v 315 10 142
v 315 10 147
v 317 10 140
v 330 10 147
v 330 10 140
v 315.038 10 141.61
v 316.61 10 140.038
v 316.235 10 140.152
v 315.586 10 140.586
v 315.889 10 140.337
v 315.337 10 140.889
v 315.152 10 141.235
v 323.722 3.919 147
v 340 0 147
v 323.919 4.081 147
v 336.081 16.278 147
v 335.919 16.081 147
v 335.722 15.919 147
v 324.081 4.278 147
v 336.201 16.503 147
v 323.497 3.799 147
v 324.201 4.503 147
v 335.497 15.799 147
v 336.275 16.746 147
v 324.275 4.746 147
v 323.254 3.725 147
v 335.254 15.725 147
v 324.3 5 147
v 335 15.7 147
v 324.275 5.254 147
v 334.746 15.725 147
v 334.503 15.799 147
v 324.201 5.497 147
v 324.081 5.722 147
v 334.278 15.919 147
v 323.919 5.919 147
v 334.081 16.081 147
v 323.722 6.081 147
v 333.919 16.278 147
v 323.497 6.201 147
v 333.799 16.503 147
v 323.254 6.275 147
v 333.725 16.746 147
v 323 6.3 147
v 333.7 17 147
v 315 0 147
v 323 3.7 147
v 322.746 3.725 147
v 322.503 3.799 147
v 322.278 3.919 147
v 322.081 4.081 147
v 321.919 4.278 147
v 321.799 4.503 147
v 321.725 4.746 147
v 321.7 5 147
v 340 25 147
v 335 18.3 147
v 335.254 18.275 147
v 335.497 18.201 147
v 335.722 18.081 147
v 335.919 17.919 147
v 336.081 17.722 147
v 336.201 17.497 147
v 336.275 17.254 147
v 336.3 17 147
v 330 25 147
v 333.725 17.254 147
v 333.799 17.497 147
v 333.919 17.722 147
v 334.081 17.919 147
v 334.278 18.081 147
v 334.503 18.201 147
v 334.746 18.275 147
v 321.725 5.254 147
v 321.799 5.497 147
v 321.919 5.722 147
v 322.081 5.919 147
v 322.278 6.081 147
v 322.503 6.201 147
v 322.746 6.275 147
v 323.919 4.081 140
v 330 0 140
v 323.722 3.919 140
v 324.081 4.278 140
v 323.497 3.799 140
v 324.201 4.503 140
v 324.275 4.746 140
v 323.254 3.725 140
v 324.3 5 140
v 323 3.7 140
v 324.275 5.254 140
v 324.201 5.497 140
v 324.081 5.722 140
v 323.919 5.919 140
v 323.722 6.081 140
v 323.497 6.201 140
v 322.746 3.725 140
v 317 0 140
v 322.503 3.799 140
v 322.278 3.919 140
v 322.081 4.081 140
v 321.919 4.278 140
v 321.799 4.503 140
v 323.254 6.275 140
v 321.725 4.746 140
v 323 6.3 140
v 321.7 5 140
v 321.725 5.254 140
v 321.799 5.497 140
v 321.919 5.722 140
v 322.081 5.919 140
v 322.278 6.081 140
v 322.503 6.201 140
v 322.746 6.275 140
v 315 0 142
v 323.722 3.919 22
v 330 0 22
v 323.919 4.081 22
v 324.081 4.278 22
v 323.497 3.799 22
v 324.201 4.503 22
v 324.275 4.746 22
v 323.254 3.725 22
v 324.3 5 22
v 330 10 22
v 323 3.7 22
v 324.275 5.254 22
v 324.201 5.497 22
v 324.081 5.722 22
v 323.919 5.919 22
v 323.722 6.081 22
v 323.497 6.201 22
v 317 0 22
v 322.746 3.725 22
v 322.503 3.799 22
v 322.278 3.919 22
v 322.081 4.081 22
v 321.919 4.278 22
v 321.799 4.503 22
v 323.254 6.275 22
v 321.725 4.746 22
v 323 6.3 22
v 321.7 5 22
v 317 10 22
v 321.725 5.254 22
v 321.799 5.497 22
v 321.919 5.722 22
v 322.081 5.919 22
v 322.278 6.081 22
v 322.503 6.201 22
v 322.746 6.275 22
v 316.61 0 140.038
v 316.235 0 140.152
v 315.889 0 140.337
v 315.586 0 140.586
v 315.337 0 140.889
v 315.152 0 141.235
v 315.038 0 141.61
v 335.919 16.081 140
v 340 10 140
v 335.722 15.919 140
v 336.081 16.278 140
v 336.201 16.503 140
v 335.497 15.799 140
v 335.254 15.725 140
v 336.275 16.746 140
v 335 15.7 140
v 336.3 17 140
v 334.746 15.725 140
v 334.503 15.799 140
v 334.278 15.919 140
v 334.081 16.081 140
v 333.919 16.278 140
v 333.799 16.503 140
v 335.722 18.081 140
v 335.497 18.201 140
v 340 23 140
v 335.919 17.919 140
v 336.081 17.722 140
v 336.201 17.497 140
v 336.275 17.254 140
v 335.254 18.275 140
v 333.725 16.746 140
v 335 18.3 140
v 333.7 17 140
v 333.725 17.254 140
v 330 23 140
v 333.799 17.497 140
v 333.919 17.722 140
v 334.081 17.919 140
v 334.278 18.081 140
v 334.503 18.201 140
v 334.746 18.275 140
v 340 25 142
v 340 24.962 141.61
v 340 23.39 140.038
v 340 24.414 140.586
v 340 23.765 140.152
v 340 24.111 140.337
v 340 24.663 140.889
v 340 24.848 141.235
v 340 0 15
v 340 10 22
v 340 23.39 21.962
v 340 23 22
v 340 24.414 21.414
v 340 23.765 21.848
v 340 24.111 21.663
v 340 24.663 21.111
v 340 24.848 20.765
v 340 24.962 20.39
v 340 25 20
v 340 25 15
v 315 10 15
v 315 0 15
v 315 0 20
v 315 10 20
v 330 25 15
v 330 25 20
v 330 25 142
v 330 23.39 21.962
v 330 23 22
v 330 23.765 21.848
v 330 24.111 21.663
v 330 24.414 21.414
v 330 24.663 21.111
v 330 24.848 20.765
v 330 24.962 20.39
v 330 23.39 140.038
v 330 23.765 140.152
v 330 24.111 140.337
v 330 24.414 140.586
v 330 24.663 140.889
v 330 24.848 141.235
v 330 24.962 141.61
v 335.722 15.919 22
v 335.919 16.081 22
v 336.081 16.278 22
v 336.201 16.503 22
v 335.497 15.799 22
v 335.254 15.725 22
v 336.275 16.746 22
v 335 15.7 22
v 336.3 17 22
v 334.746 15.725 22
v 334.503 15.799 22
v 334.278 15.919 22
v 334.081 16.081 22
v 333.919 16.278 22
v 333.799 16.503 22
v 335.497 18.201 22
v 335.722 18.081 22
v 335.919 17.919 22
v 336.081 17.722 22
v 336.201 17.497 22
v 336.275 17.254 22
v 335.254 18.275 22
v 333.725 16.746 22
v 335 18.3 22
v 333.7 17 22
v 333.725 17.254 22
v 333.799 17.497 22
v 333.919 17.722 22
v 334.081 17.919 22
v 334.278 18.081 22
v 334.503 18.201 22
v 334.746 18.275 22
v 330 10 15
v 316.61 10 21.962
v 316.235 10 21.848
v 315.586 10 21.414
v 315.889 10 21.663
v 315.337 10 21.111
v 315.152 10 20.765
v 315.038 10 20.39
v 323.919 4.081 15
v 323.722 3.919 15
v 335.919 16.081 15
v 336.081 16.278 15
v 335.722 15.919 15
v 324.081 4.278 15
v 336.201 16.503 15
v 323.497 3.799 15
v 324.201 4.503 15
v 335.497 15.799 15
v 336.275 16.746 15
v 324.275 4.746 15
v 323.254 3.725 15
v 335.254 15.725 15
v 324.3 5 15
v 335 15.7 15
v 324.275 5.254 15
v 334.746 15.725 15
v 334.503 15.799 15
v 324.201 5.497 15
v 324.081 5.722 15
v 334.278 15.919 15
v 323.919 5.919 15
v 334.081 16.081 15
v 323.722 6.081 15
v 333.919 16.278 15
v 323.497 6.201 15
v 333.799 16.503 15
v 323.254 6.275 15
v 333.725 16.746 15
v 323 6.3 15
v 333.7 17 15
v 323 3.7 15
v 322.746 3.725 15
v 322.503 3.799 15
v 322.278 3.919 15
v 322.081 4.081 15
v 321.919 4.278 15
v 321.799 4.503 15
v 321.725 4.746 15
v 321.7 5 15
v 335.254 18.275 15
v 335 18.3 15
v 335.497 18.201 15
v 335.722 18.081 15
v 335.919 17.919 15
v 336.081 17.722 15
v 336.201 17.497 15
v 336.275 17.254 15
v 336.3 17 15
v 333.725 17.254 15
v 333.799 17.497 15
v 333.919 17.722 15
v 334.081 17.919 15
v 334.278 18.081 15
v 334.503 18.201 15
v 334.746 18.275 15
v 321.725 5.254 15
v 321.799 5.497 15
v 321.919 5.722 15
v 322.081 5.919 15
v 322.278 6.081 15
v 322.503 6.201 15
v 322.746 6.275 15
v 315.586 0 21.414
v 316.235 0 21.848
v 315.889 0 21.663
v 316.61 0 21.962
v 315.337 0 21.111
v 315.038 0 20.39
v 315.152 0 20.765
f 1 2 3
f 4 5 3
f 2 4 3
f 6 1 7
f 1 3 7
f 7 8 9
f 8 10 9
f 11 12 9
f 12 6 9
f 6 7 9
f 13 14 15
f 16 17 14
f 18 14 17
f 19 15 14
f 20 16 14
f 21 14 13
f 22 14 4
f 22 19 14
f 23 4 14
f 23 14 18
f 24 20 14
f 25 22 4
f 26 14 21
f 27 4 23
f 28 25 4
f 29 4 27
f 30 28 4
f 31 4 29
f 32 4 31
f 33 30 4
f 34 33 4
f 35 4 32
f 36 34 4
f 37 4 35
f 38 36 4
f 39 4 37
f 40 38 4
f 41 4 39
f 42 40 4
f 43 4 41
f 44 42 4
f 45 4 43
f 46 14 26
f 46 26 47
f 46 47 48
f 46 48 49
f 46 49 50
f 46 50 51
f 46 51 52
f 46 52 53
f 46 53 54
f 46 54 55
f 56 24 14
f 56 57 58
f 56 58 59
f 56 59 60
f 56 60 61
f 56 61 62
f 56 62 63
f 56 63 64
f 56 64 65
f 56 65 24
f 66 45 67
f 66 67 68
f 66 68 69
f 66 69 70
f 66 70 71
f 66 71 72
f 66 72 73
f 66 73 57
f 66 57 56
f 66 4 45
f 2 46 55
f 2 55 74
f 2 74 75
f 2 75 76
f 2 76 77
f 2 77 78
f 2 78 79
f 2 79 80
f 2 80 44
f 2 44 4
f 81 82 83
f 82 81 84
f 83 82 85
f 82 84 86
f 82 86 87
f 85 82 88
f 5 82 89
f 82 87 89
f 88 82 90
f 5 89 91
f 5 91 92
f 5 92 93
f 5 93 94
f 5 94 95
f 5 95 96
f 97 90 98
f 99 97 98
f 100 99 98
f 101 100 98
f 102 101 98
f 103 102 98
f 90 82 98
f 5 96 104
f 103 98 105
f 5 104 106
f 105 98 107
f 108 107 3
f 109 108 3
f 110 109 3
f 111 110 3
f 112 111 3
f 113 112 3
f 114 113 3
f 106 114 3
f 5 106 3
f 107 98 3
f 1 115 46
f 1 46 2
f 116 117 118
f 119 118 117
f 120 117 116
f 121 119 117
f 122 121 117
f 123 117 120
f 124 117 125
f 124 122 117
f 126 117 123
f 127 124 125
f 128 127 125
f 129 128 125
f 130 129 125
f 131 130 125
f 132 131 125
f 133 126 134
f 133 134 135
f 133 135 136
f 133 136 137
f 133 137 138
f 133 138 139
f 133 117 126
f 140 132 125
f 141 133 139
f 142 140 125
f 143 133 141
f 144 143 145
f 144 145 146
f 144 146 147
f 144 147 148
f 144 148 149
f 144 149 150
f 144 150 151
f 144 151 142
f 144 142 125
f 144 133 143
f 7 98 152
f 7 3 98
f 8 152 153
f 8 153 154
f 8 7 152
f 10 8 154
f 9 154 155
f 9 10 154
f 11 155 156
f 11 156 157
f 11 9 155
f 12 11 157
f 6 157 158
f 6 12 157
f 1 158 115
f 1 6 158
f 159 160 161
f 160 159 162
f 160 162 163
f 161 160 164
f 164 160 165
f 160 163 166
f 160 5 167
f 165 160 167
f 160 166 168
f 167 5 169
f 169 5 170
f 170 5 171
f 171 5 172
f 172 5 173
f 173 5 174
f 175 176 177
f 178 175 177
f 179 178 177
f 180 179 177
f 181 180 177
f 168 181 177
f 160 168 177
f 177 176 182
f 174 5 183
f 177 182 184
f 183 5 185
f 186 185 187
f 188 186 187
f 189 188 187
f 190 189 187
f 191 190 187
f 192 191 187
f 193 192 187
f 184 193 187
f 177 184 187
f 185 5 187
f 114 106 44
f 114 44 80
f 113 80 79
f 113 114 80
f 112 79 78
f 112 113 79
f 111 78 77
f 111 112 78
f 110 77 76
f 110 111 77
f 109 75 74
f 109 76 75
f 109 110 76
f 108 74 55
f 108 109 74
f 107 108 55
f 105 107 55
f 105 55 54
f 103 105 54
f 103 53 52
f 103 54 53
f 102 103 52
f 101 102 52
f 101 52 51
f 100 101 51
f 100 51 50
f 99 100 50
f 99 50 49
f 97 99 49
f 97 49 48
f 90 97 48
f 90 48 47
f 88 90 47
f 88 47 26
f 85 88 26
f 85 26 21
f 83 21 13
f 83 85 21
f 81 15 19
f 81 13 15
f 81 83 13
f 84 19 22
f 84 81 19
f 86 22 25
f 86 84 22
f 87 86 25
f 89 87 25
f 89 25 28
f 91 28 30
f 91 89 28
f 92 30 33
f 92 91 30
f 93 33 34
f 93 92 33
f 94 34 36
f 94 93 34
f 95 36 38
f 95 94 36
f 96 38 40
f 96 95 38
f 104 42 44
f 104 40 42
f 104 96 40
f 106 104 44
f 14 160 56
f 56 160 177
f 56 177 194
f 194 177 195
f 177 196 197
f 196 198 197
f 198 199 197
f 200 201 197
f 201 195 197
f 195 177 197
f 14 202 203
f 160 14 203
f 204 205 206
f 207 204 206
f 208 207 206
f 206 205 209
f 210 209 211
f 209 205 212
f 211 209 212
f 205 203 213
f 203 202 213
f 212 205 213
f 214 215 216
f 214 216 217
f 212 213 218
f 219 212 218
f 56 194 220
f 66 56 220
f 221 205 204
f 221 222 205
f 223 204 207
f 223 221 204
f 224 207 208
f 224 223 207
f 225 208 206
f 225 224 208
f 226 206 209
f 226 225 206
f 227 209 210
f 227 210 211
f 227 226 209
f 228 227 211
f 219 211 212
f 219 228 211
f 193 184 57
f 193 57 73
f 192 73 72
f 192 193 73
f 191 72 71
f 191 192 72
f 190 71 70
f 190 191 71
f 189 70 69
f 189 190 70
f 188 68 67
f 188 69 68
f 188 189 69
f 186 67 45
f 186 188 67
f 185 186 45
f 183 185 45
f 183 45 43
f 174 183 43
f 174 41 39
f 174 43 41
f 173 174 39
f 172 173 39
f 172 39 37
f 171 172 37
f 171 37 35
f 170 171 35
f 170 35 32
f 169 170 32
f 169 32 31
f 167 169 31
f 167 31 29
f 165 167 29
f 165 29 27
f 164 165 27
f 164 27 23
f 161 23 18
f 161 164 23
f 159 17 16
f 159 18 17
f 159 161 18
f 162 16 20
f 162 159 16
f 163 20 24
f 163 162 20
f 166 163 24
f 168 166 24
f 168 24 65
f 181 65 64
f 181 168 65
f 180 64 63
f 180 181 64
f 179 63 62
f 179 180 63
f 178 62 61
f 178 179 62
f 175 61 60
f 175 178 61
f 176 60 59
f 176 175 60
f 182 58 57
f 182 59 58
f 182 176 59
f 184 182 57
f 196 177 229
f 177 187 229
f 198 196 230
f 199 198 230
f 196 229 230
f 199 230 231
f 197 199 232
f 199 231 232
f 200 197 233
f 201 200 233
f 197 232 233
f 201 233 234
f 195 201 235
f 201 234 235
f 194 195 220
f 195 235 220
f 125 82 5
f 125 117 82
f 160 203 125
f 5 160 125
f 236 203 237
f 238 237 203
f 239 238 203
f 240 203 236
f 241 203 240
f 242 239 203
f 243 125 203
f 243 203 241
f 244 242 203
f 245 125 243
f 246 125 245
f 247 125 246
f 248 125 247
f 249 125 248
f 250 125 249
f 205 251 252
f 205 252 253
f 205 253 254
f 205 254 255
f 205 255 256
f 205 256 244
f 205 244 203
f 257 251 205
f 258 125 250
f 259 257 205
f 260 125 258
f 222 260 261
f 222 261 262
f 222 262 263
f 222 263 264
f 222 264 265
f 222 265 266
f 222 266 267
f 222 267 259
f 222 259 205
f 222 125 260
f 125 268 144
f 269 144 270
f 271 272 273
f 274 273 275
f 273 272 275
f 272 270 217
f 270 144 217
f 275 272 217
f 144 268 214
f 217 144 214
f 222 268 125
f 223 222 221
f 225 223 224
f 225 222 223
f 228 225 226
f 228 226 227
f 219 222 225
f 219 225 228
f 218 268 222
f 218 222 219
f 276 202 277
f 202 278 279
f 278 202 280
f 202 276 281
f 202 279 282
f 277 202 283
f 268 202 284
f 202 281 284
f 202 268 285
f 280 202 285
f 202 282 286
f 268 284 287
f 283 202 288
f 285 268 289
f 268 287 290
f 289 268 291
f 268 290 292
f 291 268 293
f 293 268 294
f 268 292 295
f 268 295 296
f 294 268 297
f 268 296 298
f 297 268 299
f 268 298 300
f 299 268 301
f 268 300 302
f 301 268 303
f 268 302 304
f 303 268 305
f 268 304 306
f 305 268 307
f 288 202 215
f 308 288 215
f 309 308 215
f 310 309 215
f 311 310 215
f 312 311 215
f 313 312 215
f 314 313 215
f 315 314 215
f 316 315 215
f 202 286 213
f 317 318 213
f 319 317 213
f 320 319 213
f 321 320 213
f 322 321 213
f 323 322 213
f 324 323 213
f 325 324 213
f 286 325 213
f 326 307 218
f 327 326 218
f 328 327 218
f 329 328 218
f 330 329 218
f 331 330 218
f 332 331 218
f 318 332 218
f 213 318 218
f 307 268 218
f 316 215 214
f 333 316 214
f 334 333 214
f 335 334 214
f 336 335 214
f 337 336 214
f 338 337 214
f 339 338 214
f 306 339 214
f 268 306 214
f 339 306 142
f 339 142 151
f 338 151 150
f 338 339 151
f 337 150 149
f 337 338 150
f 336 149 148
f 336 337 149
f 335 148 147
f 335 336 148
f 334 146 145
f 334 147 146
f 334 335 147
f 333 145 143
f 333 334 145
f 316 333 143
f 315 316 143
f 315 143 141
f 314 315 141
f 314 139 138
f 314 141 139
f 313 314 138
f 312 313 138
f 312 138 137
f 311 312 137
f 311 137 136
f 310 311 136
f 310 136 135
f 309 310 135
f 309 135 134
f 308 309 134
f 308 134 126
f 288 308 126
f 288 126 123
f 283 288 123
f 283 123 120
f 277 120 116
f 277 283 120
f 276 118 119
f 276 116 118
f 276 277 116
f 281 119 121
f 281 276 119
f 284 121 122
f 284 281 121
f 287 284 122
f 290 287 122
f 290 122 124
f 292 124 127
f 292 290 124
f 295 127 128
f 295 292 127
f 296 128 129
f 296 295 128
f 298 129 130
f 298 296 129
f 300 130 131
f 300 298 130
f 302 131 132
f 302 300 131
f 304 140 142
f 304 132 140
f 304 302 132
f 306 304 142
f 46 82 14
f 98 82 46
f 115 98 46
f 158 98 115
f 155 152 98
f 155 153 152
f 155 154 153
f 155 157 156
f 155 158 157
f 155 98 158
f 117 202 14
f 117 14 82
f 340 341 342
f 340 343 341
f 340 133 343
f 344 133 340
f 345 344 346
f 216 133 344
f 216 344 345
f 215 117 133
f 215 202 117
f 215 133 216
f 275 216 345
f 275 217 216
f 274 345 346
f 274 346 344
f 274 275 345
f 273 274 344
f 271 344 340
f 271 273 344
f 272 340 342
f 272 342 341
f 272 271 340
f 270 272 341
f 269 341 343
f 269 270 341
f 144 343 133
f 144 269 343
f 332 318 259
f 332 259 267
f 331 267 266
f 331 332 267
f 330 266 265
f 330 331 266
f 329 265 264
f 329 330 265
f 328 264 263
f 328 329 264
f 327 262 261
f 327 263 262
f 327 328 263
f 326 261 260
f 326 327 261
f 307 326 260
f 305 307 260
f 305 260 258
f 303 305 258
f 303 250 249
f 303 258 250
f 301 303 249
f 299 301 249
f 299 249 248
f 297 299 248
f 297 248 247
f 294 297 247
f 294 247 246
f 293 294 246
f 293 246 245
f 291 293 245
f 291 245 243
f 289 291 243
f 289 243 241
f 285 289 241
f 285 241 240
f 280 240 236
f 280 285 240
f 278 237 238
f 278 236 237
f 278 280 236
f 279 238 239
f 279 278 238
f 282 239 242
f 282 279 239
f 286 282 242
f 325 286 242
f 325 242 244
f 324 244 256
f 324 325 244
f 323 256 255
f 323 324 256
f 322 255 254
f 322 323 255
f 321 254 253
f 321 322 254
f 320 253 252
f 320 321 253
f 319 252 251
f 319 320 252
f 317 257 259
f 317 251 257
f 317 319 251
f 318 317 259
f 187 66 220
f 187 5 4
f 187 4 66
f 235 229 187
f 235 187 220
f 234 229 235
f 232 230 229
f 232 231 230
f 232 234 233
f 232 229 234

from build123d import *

# Parameters (mm, degrees)
CYLINDER014_R          = 1.3
CYLINDER014_DEPTH      = 146
CYLINDER013_R          = 1.3
CYLINDER013_DEPTH      = 146
BOX072_W               = 10
BOX072_H               = 10
BOX072_DEPTH           = 132
BOX076_W               = 15
BOX076_H               = 10
BOX076_DEPTH           = 7
BOX074_W               = 10
BOX074_H               = 15
BOX074_DEPTH           = 7
BOX075_W               = 10
BOX075_H               = 15
BOX075_DEPTH           = 7
BOX073_W               = 15
BOX073_H               = 10
BOX073_DEPTH           = 7
FILLET002_R            = 2
CUT027_PLACEMENT_ANGLE = 90


with BuildPart() as cilindro014:
    # Cylinder014 → Cylinder014 (new body)
    with BuildSketch(Plane(origin=(5, 17, 8), x_dir=(1, 0, 0), z_dir=(0, 0, 1))):
        Circle(CYLINDER014_R)
    extrude(amount=CYLINDER014_DEPTH)


with BuildPart() as cilindro013:
    # Cylinder013 → Cylinder013 (new body)
    with BuildSketch(Plane(origin=(17, 5, 8), x_dir=(1, 0, 0), z_dir=(0, 0, 1))):
        Circle(CYLINDER013_R)
    extrude(amount=CYLINDER013_DEPTH)


with BuildPart() as cubo035:
    # Box072 → Box072 (new body)
    with BuildSketch(Plane.XY.offset(15)):
        with Locations((5, 5)):
            Rectangle(BOX072_W, BOX072_H)
    extrude(amount=BOX072_DEPTH)


with BuildPart() as cubo039:
    # Box076 → Box076 (new body)
    with BuildSketch(Plane(origin=(10, 0, 140), x_dir=(1, 0, 0), z_dir=(0, 0, 1))):
        with Locations((7.5, 5)):
            Rectangle(BOX076_W, BOX076_H)
    extrude(amount=BOX076_DEPTH)


with BuildPart() as cubo037:
    # Box074 → Box074 (new body)
    with BuildSketch(Plane(origin=(0, 10, 15), x_dir=(1, 0, 0), z_dir=(0, 0, 1))):
        with Locations((5, 7.5)):
            Rectangle(BOX074_W, BOX074_H)
    extrude(amount=BOX074_DEPTH)


with BuildPart() as cubo038:
    # Box075 → Box075 (new body)
    with BuildSketch(Plane(origin=(0, 10, 140), x_dir=(1, 0, 0), z_dir=(0, 0, 1))):
        with Locations((5, 7.5)):
            Rectangle(BOX075_W, BOX075_H)
    extrude(amount=BOX075_DEPTH)


with BuildPart() as pilar003:
    # Box073 → Box073 (new body)
    with BuildSketch(Plane(origin=(10, 0, 15), x_dir=(1, 0, 0), z_dir=(0, 0, 1))):
        with Locations((7.5, 5)):
            Rectangle(BOX073_W, BOX073_H)
    extrude(amount=BOX073_DEPTH)

    # Fusion010: union Cubo035, Cubo039, Cubo037, Cubo038
    add(cubo035.part)
    add(cubo039.part)
    add(cubo037.part)
    add(cubo038.part)

    # Fillet002
    fillet002_edges = [pilar003.edges().sort_by_distance(p)[0] for p in [
        (25, 5, 22),
        (25, 5, 140),
        (5, 25, 22),
        (5, 25, 140),
    ]]
    fillet(fillet002_edges, radius=FILLET002_R)

    # Cut028: cut Cilindro013
    add(cilindro013.part, mode=Mode.SUBTRACT)

    # Cut027: cut Cilindro014
    add(cilindro014.part, mode=Mode.SUBTRACT)


with BuildPart() as pilar003_1:
    # Cut027 placement: moved
    add(pilar003.part.moved(Location((340, 0, 0))).rotate(Axis((340, 0, 0), (0, 0, 1)), CUT027_PLACEMENT_ANGLE))


solid = pilar003_1.part
